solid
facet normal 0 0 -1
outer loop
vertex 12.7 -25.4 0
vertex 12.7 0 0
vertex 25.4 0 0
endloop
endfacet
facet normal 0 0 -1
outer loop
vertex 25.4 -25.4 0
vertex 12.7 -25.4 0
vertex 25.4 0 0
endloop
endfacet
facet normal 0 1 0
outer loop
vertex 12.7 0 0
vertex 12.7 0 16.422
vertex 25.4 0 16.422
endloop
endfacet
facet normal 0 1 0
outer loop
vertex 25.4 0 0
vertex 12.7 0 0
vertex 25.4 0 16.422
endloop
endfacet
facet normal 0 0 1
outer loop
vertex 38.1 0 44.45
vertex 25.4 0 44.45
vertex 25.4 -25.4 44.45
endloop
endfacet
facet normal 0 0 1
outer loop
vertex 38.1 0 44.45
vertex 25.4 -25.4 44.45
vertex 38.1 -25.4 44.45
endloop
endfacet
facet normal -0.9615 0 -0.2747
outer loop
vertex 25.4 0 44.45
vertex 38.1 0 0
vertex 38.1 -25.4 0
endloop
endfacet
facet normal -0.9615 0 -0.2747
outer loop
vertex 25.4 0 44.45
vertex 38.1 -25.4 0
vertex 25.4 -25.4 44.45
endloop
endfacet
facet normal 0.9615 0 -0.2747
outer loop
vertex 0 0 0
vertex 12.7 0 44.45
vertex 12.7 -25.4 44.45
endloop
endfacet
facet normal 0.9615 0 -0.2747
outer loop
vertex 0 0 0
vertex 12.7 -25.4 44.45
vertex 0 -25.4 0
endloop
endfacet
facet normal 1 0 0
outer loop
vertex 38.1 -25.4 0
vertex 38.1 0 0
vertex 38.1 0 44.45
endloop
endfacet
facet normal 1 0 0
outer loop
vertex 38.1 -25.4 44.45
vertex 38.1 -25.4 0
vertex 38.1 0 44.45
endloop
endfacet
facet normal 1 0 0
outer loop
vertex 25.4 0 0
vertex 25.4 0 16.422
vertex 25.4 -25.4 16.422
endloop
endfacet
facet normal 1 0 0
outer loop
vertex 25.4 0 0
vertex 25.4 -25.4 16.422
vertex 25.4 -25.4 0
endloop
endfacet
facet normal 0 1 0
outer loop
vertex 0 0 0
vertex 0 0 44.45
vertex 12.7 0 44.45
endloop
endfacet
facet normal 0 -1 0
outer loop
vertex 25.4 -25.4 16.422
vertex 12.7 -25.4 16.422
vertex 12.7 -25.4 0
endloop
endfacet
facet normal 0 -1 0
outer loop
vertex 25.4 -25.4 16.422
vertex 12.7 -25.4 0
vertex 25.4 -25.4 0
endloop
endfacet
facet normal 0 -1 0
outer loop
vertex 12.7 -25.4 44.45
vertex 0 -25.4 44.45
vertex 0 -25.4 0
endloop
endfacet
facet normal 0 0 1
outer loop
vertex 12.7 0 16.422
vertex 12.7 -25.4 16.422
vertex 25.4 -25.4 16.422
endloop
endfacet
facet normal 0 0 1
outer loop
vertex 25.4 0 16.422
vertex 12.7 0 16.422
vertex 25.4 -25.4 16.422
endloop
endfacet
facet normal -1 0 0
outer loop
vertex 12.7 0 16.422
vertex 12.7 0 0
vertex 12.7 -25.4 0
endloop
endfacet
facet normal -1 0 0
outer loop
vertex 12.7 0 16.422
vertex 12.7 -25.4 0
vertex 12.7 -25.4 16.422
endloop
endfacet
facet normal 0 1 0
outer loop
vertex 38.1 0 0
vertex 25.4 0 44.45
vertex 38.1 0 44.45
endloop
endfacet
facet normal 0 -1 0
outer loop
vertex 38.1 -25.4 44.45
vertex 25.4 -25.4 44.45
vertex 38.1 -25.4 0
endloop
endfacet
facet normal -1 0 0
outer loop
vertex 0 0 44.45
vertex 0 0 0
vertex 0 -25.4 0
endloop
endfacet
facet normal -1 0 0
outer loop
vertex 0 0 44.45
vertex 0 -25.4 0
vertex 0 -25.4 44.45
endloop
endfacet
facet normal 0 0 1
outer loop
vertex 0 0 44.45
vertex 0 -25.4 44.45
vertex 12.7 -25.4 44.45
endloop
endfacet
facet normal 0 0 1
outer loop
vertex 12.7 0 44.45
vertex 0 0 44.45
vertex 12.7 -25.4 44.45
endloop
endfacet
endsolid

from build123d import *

# Parameters (mm, degrees)
F0_W     = 38.1
F0_H     = 44.45
F1_DEPTH = 25.4
F3_DEPTH = 25.4
F4_DEPTH = 25.4


with BuildPart() as f1:
    # F0 (on Front) → F1 (new body)
    with BuildSketch(Plane.XZ):
        with Locations((19.05, 22.225)):
            Rectangle(F0_W, F0_H)
    extrude(amount=F1_DEPTH)


with BuildPart() as f3:
    # F2 (on Front) → F3 (new body)
    with BuildSketch(Plane.XZ):
        Polygon((25.4, 44.45), (12.7, 44.45), (0, 0), (12.7, 0), (12.7, 16.4224114985), (25.4, 16.4224114985), (25.4, 0), (38.1, 0), align=None)
    extrude(amount=F3_DEPTH)


with BuildPart() as f4_tool:
    # F2 (on Front) → F4 (new body)
    with BuildSketch(Plane.XZ):
        Polygon((25.4, 44.45), (12.7, 44.45), (0, 0), (12.7, 0), (12.7, 16.4224114985), (25.4, 16.4224114985), (25.4, 0), (38.1, 0), align=None)
    extrude(amount=F4_DEPTH)


with BuildPart() as f1_1:
    add(f1.part)

    # F4: cut by f4_tool
    add(f4_tool.part, mode=Mode.SUBTRACT)


with BuildPart() as f3_1:
    add(f3.part)

    # F4: cut by f4_tool
    add(f4_tool.part, mode=Mode.SUBTRACT)


solid = f1_1.part
